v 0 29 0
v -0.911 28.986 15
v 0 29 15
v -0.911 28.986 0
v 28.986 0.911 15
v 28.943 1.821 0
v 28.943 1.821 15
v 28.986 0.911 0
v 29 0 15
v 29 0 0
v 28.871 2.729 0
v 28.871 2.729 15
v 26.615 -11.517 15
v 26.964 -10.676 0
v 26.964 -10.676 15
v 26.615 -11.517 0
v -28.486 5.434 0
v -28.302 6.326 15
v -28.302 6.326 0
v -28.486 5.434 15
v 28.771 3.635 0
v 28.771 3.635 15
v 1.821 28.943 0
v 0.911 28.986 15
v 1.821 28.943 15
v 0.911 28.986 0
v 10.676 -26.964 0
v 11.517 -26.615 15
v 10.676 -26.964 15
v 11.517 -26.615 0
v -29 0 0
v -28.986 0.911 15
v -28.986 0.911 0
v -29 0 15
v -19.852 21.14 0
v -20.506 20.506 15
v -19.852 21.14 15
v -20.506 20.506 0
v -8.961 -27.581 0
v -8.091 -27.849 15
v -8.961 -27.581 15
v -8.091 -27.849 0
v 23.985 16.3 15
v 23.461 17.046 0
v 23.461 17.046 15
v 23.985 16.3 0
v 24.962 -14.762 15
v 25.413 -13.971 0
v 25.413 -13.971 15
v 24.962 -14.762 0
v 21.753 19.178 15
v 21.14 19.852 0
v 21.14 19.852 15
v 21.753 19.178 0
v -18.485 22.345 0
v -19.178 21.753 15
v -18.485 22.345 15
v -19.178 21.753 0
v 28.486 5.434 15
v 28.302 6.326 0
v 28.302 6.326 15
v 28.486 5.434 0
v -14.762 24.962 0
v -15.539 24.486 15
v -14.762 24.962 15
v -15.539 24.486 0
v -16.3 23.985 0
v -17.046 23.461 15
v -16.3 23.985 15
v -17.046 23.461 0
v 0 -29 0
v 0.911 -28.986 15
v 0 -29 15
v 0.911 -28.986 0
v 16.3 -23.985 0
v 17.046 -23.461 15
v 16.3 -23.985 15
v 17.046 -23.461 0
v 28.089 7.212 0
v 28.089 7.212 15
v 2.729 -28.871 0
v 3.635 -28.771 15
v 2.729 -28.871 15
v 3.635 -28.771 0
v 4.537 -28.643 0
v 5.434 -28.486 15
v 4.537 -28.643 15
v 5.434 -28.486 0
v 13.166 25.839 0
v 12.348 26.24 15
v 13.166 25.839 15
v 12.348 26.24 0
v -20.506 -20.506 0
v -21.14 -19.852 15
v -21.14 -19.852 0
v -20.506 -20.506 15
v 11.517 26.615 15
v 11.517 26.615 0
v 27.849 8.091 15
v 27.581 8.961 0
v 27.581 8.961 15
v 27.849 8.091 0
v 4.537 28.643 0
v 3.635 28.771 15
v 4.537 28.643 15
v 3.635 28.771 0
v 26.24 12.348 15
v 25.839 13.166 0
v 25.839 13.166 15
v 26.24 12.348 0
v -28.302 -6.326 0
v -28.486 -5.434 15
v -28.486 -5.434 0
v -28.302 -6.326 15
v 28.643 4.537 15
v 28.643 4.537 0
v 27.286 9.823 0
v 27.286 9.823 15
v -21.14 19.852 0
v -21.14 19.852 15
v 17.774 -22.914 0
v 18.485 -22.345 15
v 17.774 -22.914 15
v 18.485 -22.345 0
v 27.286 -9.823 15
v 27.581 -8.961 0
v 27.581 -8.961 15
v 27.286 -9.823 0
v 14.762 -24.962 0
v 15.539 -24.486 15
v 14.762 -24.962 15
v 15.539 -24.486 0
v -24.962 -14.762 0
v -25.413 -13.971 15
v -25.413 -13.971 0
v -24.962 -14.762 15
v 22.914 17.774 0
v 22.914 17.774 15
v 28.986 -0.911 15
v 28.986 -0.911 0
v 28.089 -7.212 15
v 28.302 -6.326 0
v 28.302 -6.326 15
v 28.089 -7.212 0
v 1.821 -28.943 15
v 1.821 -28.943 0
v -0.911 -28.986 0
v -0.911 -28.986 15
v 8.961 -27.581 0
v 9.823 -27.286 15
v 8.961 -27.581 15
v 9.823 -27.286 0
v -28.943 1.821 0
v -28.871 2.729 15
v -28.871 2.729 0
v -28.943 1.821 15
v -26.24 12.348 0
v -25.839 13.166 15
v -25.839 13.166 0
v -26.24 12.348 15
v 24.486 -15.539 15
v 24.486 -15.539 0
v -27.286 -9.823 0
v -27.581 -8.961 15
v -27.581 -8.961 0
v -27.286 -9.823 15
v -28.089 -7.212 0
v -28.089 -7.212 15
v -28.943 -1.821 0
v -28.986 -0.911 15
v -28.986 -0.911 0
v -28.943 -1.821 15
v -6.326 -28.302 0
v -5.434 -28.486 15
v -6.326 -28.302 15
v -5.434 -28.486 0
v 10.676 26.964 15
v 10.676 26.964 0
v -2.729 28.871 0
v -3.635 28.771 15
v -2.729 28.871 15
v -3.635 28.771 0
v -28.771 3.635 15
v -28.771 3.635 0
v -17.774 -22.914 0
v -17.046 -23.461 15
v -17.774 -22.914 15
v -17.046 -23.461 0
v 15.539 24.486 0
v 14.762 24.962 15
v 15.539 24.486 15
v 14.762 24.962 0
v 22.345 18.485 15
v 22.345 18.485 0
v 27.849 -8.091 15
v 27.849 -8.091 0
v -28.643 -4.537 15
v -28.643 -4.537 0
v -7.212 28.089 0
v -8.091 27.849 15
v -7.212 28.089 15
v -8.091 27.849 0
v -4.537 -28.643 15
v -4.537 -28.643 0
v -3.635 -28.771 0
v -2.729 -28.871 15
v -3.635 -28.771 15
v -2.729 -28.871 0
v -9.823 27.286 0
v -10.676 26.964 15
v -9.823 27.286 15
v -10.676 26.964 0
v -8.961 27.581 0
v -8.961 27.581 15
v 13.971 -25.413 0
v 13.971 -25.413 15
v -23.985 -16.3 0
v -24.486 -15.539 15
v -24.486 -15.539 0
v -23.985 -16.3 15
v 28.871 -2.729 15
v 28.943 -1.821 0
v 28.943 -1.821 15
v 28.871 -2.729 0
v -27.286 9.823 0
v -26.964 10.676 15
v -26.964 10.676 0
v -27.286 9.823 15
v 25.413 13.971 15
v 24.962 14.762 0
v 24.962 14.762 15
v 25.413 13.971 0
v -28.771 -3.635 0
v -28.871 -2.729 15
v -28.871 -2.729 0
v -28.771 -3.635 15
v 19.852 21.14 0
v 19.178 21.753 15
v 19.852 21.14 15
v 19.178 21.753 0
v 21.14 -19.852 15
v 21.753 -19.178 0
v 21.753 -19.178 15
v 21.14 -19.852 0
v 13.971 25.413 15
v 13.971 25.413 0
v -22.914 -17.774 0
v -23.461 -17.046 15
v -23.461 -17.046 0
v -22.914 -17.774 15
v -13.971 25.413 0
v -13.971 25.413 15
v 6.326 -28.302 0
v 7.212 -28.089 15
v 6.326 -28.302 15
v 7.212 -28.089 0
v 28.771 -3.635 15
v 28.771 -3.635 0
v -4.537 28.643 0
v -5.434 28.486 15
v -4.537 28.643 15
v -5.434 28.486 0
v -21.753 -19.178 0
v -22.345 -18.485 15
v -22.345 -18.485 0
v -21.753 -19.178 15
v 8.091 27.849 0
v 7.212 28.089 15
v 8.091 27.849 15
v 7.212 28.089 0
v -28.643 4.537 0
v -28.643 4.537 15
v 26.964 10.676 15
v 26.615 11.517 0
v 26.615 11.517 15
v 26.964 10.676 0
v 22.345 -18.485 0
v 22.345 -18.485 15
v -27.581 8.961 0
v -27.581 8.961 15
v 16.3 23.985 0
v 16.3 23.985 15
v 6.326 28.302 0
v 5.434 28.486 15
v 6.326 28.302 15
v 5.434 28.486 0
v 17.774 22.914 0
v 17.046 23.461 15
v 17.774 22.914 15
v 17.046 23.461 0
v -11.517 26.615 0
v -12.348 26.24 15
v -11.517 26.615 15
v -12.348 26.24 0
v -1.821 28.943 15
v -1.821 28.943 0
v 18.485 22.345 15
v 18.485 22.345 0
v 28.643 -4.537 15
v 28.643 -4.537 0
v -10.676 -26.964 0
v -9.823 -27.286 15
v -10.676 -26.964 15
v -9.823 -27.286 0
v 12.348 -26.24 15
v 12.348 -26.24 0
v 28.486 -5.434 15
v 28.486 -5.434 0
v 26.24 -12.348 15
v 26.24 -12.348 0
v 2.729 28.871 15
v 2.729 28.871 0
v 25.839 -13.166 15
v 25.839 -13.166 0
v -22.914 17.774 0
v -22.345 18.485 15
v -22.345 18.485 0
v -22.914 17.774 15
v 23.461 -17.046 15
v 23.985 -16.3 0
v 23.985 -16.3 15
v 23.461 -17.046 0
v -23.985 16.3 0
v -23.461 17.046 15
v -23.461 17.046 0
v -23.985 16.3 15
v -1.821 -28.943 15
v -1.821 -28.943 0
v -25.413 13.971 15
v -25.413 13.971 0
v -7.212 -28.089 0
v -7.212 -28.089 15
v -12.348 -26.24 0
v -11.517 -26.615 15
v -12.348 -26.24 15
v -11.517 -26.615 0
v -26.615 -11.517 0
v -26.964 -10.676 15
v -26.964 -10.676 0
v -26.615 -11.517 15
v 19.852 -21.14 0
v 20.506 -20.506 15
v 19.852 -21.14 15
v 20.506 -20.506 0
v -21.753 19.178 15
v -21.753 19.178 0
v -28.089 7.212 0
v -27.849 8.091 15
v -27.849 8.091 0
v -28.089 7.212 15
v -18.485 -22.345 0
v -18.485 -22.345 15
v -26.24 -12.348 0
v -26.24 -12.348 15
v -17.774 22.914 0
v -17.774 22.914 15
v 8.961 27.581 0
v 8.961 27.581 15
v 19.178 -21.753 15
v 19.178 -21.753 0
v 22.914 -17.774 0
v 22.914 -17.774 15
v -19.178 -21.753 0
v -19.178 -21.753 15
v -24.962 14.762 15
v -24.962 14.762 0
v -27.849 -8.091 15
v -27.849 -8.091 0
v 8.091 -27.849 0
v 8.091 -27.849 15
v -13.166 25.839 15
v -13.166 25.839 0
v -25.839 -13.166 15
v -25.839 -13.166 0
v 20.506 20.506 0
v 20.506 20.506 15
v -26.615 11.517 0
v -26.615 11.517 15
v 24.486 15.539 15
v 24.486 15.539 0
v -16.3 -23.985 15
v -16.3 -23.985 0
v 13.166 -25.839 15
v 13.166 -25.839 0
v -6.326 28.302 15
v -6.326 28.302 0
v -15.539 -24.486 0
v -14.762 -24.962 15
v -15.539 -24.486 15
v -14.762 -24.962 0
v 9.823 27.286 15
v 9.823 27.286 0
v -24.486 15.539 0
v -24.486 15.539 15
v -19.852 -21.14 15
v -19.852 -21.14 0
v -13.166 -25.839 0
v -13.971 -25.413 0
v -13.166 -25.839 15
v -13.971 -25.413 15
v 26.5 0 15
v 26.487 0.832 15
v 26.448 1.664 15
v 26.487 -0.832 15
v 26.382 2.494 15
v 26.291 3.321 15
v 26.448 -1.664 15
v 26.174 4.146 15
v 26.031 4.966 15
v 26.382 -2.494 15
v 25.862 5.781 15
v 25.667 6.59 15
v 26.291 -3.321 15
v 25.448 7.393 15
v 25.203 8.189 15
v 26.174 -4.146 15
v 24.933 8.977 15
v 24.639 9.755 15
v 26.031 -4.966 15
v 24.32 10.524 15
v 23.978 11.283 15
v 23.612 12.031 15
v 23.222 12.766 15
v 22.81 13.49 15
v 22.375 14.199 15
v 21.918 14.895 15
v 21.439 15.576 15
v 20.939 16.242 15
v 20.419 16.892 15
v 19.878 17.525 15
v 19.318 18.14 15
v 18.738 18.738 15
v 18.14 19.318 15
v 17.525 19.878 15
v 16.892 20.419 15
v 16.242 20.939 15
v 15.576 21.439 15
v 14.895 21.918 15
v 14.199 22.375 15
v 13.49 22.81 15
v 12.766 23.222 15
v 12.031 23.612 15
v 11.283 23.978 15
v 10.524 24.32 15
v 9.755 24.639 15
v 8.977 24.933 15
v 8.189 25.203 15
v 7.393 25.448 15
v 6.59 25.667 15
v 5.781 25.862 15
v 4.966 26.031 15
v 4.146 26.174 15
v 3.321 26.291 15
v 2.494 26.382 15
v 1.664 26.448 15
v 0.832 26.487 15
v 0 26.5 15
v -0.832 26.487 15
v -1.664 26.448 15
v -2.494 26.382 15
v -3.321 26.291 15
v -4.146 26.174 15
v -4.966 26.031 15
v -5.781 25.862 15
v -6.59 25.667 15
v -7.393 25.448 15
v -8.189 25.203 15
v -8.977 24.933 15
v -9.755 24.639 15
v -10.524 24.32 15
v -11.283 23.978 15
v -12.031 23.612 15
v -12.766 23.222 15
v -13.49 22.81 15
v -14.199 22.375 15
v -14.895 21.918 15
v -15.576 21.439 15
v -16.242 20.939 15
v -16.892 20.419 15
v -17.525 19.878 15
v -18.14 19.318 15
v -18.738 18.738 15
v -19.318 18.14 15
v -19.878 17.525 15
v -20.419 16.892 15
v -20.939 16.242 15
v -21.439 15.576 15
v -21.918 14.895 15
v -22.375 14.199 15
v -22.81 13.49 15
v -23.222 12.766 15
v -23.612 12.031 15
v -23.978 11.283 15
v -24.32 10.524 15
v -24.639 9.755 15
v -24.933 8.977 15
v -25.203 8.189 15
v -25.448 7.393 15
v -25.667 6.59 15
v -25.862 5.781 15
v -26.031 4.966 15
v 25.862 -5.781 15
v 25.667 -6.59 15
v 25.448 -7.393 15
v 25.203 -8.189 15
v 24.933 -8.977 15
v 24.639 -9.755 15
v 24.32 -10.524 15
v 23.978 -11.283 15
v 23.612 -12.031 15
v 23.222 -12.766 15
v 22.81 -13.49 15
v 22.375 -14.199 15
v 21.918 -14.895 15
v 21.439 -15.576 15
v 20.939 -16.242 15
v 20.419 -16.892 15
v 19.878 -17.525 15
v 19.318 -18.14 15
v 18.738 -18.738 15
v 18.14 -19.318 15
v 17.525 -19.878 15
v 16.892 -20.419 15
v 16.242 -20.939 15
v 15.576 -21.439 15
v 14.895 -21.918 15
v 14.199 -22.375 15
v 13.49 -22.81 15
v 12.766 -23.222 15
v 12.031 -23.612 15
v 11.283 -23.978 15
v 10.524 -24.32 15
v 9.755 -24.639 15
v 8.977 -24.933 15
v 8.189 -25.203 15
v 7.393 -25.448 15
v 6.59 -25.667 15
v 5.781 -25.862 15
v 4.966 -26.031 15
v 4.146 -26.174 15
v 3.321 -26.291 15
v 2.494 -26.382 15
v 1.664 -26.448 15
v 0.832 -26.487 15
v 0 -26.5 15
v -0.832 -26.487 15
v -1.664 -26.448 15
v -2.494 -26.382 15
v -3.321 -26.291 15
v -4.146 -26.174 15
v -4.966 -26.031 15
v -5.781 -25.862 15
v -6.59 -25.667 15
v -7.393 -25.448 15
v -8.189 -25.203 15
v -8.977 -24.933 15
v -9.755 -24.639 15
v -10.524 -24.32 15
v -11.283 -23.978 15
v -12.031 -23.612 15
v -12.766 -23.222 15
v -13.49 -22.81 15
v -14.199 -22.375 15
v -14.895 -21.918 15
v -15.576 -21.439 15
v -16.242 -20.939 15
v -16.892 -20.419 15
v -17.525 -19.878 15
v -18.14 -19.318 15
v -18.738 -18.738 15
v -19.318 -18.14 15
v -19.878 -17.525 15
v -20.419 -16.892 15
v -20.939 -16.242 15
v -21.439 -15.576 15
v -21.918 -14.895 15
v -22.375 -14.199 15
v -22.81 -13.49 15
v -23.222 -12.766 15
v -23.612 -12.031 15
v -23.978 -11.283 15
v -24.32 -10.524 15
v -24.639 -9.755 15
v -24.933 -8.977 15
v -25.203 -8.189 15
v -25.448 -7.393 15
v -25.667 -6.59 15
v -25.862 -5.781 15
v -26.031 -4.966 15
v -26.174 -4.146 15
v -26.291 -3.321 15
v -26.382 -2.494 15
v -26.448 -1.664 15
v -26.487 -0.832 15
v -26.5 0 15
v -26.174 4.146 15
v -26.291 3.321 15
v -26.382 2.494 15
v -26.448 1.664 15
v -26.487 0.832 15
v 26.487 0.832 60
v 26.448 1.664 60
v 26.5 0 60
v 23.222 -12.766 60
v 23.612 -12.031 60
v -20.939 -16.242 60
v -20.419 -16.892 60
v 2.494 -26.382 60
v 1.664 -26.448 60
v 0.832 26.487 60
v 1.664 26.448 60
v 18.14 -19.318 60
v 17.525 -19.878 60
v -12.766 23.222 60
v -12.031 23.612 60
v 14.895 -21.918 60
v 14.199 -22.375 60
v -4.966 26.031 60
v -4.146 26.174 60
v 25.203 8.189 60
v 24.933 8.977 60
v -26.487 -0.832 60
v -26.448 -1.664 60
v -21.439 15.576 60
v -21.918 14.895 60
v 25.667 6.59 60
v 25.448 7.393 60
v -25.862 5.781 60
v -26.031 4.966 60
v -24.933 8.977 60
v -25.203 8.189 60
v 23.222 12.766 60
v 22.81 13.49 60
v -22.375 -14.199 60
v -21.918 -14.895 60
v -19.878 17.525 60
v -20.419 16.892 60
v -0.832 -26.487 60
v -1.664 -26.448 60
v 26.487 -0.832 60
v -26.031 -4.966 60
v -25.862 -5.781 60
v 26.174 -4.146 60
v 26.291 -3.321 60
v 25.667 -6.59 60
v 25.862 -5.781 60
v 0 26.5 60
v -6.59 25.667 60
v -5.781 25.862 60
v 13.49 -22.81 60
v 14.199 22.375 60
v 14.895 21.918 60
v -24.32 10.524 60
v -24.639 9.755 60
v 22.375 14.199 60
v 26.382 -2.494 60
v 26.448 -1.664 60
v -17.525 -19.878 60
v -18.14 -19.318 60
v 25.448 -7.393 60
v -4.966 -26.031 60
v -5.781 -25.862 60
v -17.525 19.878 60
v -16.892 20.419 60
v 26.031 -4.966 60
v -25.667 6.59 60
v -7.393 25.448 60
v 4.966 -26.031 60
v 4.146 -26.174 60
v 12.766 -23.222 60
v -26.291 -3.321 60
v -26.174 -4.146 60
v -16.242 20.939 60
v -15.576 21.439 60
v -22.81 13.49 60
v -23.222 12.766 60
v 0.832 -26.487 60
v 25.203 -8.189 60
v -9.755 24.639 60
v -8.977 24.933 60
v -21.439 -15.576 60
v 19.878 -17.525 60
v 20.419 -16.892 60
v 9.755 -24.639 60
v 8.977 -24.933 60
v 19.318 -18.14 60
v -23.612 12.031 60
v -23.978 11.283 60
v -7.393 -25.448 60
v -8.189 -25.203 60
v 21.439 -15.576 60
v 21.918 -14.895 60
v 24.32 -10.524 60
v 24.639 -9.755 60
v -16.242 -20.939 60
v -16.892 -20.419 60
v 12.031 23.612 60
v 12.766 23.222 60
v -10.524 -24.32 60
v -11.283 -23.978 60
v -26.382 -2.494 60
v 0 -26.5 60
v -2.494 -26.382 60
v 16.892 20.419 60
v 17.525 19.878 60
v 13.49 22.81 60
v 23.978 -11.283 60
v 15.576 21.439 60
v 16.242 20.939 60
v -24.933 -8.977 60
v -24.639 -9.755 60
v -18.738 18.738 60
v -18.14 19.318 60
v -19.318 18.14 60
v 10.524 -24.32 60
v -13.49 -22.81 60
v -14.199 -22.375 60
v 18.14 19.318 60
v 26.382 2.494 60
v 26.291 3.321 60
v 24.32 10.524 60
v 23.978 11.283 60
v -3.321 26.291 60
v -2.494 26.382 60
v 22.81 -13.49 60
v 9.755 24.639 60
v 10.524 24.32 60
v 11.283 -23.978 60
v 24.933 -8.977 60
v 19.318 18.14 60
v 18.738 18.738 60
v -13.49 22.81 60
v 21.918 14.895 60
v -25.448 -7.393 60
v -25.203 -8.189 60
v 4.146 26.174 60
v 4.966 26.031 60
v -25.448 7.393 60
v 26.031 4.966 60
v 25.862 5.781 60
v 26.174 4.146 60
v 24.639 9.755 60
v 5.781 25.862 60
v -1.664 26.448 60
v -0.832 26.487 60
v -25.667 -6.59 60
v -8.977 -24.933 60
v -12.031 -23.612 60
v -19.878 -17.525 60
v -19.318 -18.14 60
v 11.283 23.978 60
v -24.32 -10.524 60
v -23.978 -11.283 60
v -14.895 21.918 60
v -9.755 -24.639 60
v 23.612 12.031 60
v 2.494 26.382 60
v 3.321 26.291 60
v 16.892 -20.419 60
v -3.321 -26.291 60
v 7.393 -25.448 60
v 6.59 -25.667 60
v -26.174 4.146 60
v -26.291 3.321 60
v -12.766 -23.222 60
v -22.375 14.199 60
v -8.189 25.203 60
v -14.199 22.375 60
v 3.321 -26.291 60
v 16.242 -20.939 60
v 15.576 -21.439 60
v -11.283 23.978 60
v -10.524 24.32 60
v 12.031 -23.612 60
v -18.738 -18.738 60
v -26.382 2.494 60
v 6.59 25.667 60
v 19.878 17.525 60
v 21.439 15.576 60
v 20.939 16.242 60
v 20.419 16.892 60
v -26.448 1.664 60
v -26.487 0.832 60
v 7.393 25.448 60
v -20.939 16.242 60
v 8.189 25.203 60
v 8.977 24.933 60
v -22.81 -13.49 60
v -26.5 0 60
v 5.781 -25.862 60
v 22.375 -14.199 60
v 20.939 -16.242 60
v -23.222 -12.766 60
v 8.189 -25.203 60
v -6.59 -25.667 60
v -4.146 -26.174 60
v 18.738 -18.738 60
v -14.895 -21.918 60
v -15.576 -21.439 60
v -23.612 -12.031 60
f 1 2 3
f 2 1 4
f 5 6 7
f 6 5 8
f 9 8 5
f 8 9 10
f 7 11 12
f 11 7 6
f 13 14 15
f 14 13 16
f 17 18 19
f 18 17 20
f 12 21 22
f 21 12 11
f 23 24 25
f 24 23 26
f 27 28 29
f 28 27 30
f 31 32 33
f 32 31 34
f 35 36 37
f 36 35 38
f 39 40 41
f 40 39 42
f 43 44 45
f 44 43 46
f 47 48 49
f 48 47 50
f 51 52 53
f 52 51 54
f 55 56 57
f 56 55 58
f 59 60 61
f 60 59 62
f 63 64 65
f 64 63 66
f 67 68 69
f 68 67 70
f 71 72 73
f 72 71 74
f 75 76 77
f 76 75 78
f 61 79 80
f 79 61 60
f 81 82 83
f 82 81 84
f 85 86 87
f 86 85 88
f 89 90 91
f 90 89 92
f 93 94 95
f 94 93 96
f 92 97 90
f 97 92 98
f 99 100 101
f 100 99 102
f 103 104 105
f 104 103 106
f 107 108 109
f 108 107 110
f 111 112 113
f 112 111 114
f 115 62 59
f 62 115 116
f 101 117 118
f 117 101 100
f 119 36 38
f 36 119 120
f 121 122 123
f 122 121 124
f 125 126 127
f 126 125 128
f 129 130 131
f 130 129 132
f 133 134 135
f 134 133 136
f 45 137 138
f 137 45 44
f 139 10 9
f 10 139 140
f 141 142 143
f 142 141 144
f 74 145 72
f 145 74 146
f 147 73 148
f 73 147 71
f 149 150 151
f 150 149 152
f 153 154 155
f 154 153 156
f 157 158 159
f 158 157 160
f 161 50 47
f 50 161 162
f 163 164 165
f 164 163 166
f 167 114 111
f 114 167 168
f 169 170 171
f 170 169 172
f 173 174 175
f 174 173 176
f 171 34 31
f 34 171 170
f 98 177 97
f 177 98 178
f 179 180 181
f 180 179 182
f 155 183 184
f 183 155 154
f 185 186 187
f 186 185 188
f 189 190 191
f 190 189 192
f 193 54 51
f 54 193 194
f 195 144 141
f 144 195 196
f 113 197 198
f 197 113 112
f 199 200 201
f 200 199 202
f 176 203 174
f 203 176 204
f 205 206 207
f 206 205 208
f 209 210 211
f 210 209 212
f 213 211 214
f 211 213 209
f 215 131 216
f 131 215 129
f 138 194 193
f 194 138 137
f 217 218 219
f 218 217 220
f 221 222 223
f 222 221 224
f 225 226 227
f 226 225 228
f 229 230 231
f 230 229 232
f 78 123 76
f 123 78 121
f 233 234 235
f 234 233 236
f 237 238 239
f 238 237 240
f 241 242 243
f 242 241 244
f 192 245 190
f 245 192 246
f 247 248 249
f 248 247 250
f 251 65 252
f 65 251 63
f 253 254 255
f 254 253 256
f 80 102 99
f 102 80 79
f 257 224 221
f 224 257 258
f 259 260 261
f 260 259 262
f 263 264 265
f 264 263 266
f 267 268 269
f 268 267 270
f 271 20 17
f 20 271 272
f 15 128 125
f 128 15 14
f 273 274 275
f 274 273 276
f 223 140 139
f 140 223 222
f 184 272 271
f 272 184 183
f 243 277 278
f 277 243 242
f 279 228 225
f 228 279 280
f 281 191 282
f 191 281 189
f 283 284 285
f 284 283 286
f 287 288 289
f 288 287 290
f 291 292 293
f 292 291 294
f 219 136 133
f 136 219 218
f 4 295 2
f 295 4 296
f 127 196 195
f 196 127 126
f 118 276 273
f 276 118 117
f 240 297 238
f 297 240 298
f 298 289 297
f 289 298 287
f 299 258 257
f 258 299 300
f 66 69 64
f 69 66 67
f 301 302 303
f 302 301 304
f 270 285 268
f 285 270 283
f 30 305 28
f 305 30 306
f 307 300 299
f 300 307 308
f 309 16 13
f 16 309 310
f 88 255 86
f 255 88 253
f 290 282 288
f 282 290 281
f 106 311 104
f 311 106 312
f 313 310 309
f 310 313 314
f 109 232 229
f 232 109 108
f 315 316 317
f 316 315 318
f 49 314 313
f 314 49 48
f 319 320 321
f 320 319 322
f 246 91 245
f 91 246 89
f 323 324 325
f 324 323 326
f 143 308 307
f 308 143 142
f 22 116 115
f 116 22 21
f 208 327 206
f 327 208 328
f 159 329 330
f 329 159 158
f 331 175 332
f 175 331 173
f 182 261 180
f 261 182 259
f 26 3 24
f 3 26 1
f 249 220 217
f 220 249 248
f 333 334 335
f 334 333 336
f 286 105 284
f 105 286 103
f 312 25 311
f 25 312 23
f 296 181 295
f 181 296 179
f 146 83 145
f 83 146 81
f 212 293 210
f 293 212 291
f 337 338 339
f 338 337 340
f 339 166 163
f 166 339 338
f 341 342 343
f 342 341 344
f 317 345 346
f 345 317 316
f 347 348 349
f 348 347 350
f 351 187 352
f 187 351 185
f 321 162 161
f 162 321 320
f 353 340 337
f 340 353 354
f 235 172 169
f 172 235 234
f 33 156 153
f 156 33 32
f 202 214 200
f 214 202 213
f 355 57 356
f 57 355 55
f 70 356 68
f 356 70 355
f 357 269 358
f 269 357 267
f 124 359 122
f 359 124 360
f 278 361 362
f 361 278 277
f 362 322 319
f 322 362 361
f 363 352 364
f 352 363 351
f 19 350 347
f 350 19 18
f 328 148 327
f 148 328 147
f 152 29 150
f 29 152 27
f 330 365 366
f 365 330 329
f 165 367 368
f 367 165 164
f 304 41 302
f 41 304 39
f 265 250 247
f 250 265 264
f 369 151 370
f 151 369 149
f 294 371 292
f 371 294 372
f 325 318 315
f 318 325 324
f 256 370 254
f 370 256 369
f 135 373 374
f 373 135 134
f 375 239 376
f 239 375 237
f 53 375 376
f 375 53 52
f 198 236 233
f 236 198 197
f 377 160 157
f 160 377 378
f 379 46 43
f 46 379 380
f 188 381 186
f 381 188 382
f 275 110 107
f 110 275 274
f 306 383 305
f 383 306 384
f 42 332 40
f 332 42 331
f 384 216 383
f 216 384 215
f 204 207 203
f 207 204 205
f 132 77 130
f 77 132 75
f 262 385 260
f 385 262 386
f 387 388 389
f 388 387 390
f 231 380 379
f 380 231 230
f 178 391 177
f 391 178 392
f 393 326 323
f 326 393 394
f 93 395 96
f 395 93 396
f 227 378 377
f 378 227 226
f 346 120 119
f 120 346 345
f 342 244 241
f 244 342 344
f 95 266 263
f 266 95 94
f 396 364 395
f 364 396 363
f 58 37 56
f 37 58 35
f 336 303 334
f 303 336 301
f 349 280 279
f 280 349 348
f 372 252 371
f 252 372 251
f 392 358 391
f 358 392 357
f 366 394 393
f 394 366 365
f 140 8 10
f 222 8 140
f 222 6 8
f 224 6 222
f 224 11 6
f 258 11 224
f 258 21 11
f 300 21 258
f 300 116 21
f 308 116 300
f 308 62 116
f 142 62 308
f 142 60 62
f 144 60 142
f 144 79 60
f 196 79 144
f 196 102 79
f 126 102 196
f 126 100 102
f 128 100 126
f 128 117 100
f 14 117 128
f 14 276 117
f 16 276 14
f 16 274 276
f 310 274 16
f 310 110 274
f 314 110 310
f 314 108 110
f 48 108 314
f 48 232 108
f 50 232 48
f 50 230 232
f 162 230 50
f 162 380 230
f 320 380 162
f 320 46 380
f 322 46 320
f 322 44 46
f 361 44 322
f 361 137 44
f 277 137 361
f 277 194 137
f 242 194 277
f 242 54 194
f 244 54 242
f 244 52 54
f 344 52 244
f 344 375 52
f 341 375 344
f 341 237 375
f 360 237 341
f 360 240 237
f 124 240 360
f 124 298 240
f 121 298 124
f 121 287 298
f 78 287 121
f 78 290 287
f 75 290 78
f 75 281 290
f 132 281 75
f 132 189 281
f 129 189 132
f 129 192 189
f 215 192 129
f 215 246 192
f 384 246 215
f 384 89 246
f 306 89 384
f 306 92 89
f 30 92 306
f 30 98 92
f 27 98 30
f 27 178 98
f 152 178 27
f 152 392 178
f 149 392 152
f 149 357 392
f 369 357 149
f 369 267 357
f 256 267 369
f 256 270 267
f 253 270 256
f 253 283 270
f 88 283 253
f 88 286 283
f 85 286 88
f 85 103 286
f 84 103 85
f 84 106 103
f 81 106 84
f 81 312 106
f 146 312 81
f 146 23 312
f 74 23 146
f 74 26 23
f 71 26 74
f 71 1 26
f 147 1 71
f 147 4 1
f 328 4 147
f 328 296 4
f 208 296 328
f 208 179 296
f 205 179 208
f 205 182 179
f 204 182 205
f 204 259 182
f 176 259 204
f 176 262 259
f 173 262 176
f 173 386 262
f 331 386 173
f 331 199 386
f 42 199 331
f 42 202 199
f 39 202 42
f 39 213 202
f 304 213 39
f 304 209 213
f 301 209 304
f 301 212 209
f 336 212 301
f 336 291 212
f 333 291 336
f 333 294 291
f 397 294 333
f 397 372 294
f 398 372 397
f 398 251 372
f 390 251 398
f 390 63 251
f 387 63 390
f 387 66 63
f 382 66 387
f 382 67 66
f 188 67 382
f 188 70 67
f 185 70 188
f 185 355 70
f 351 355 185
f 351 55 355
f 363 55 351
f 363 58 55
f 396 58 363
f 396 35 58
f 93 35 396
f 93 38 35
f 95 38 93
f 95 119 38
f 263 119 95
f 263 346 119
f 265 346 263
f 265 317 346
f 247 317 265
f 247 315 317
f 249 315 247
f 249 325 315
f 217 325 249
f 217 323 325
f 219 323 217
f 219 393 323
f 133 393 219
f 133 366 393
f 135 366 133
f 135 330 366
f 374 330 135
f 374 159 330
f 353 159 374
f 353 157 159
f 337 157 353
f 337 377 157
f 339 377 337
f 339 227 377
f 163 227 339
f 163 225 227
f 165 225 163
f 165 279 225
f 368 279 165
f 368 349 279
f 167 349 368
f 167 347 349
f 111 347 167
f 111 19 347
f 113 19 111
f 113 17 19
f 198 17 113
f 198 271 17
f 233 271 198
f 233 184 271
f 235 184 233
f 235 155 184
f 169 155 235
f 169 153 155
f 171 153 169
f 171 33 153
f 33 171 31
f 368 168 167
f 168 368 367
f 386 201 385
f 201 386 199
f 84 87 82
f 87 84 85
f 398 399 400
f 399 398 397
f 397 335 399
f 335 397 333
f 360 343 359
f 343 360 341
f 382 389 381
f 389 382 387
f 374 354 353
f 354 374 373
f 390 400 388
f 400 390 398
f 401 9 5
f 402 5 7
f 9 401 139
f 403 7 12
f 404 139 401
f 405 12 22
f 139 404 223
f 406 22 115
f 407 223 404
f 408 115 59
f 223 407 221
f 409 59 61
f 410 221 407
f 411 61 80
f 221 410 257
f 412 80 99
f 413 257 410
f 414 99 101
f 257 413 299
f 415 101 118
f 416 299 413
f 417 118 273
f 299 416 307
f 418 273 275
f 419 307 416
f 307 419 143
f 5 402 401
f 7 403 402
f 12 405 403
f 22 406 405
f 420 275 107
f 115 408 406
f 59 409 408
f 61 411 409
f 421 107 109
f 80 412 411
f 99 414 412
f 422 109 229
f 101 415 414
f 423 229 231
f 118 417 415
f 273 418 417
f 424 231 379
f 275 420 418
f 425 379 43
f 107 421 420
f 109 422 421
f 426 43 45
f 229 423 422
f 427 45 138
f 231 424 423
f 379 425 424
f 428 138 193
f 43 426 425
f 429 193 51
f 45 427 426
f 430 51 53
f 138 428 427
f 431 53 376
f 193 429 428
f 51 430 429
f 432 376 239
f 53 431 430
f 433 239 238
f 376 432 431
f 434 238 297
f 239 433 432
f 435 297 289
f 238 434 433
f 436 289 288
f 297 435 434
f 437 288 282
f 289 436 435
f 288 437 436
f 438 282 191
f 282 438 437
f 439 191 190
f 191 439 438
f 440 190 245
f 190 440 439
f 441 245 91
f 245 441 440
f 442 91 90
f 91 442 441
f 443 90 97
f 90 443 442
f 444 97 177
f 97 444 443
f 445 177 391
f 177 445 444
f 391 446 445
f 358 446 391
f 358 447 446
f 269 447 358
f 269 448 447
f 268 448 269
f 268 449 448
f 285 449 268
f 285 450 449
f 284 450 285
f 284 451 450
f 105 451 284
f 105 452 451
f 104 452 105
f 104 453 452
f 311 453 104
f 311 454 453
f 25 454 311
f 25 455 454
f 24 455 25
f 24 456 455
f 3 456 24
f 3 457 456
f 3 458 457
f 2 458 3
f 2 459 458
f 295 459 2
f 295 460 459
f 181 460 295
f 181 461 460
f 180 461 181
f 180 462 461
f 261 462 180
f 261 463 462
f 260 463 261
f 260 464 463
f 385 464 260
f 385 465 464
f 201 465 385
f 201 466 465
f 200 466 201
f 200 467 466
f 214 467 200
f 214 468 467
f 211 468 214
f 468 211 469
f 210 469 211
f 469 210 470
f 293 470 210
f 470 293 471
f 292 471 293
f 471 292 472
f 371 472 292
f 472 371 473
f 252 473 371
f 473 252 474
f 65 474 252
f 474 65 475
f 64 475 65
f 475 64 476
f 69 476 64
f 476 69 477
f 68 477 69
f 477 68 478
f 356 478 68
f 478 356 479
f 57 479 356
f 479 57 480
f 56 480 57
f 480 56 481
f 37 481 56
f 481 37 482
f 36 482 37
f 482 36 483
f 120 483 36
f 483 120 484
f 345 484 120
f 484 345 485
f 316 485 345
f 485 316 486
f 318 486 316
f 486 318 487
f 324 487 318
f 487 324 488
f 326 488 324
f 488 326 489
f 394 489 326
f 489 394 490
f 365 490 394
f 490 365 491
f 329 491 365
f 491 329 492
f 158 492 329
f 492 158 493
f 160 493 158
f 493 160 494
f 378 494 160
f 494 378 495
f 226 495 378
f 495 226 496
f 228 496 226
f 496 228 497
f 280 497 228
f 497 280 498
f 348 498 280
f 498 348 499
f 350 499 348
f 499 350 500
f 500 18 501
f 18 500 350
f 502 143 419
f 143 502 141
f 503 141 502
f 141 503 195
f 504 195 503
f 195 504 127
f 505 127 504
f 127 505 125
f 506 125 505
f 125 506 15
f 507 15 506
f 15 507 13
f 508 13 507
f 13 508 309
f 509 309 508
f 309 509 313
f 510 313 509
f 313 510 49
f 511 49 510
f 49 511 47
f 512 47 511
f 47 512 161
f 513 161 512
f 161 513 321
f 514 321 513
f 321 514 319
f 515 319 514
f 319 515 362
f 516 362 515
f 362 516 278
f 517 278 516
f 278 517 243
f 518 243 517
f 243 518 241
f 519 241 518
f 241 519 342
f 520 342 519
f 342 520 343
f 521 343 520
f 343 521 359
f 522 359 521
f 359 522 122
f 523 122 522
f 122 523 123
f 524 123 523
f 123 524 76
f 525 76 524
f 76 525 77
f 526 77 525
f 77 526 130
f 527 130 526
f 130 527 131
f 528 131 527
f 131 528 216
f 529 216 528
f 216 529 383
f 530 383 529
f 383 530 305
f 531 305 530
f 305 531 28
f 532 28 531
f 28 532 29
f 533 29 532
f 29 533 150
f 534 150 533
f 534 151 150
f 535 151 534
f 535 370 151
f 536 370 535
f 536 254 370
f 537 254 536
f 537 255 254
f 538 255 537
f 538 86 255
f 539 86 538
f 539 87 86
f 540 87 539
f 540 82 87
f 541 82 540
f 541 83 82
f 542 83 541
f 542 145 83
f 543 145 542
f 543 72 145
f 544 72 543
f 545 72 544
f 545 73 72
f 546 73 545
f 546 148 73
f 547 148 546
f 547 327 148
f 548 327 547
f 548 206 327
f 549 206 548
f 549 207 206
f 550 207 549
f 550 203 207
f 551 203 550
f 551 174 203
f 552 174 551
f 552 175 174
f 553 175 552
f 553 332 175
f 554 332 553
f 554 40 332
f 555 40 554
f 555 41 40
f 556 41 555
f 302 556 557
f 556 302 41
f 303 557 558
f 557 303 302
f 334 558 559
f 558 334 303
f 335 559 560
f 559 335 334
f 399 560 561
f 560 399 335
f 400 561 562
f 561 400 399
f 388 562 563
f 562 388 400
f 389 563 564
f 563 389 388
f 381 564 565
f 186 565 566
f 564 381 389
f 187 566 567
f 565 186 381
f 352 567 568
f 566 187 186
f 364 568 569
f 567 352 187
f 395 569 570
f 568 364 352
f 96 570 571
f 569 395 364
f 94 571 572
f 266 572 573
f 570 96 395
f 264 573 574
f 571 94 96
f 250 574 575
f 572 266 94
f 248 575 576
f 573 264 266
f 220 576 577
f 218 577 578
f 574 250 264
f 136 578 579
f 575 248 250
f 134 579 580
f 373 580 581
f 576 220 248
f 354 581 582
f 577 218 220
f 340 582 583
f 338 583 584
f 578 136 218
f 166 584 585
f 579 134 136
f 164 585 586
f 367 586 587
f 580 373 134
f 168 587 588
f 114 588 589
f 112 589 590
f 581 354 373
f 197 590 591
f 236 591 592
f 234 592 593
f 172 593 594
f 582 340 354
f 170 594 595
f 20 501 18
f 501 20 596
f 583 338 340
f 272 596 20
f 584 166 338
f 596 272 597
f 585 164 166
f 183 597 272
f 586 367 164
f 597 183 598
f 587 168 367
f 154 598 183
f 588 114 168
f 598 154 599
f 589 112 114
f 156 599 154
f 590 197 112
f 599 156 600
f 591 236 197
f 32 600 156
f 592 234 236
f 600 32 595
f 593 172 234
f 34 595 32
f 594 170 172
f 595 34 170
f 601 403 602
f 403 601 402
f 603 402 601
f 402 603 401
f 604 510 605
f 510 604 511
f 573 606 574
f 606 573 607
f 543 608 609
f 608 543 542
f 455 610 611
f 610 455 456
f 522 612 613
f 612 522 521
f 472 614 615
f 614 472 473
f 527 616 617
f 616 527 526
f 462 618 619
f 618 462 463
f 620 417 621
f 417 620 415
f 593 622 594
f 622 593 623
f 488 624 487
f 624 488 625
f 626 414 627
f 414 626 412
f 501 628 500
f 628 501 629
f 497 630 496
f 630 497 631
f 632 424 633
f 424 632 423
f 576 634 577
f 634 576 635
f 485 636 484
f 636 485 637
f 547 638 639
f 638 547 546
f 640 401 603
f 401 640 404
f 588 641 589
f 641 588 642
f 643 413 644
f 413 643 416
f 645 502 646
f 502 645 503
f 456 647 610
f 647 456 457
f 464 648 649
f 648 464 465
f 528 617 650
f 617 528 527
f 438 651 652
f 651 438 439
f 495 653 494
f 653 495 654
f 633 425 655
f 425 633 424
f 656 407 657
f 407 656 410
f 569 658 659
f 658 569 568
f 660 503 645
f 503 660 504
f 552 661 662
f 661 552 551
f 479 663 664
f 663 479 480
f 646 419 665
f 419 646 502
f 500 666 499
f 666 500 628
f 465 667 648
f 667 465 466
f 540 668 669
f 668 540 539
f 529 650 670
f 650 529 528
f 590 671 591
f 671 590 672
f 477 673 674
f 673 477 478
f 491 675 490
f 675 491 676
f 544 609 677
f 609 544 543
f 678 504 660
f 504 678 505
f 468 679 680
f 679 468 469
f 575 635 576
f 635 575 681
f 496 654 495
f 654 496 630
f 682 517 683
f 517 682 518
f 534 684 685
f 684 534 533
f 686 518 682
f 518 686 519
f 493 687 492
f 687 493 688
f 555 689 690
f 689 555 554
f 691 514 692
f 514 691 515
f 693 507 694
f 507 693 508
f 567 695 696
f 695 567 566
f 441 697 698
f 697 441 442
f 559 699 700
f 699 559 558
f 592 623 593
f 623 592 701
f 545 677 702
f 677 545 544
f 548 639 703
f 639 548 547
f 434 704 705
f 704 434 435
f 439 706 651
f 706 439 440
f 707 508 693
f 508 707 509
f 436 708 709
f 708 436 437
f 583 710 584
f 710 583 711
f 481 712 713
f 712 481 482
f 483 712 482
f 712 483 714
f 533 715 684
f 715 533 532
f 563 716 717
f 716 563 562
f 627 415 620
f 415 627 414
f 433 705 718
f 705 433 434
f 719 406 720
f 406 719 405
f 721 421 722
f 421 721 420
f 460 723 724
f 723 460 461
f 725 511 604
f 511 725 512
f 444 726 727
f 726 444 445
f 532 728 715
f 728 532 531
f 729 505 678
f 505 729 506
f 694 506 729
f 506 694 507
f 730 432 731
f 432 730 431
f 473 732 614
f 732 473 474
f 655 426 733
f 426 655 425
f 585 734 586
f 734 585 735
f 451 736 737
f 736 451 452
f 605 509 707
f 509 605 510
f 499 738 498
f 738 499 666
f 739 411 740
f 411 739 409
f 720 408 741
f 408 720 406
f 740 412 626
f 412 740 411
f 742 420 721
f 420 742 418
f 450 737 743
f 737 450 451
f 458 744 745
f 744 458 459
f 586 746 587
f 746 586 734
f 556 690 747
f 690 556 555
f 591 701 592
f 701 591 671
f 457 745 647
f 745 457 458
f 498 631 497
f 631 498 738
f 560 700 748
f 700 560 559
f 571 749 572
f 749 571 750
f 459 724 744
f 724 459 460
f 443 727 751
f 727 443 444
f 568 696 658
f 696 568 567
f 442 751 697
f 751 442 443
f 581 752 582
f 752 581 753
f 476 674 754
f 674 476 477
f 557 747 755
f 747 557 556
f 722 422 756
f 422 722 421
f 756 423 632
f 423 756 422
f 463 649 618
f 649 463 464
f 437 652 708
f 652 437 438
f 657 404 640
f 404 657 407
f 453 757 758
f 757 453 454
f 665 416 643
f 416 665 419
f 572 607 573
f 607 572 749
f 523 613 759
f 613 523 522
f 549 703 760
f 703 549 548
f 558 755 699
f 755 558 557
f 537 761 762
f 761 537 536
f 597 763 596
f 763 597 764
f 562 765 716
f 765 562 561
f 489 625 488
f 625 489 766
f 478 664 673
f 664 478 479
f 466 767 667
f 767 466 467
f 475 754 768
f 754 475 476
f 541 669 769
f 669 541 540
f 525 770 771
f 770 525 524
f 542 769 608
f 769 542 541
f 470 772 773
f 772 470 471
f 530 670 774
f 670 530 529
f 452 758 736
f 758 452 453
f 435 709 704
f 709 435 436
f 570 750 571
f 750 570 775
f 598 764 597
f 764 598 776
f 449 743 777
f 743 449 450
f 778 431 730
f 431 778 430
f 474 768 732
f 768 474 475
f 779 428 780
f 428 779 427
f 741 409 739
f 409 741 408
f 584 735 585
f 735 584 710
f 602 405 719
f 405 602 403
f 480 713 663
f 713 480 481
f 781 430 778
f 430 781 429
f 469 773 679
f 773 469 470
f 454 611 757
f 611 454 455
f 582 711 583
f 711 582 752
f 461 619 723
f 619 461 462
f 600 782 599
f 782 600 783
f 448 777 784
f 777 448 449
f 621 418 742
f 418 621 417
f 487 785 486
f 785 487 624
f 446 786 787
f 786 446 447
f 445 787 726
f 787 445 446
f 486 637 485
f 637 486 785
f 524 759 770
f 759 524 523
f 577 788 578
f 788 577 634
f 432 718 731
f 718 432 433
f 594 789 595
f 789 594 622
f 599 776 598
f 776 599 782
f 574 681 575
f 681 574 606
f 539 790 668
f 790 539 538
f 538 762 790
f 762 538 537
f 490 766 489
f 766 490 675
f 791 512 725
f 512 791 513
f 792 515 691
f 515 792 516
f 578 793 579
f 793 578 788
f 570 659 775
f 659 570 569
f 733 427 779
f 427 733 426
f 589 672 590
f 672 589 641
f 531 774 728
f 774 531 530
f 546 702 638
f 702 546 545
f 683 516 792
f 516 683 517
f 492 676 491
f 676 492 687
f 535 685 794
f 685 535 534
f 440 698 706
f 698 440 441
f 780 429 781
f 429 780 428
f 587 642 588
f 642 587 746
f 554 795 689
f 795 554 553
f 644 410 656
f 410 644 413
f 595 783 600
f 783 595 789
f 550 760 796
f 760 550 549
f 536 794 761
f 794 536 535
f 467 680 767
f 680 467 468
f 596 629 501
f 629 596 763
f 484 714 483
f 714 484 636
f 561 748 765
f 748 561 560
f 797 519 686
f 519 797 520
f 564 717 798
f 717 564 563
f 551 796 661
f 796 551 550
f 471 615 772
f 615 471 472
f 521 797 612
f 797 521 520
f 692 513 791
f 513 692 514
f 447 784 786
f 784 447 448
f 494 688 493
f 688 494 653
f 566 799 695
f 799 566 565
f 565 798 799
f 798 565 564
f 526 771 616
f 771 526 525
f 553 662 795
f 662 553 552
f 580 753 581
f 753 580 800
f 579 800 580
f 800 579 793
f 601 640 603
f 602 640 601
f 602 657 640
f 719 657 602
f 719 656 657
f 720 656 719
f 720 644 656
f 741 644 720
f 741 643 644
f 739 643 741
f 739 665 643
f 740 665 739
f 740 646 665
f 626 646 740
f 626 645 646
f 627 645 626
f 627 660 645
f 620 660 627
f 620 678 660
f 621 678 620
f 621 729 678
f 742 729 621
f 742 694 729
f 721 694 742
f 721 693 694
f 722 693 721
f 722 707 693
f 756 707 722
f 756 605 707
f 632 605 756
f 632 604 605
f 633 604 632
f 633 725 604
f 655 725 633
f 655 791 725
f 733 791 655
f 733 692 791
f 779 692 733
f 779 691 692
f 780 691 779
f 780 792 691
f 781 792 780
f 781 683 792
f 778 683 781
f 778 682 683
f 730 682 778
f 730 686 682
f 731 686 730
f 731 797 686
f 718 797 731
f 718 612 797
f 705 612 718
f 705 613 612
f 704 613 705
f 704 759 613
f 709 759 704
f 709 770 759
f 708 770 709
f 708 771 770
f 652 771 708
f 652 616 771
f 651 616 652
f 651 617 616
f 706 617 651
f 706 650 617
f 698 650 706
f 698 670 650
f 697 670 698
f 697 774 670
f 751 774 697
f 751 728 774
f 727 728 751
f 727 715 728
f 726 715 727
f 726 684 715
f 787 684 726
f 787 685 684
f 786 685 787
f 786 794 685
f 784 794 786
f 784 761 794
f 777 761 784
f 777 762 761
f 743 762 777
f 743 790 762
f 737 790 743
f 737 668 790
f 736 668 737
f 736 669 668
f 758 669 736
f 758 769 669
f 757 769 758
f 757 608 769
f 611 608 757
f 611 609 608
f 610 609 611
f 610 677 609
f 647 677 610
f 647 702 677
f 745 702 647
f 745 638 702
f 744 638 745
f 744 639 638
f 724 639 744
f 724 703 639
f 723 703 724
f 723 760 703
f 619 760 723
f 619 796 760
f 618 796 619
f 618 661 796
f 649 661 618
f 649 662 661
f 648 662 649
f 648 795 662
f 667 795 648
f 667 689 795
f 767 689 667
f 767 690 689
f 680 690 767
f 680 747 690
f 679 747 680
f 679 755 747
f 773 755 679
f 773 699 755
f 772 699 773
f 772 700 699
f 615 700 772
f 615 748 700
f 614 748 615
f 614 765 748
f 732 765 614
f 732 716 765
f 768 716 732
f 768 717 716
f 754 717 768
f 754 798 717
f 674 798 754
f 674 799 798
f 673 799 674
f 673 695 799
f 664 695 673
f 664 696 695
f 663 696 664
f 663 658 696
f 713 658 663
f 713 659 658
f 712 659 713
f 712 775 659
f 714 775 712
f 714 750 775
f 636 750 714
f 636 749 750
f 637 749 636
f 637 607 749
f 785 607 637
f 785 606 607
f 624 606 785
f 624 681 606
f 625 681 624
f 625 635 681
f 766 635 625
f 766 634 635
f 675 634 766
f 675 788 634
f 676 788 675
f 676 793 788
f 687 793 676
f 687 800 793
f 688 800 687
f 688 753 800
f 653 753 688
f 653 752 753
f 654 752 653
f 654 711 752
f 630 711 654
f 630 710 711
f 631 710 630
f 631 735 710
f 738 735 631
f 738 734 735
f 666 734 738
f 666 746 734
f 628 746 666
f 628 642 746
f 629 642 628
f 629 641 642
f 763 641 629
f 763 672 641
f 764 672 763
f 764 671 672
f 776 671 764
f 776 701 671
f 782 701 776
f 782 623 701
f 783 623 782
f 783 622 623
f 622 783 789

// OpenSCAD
/*
    Double-ended (duel) Espresso Tamper
    https://github.com/GeoMaciolek/double-ended-espresso-tamper


/*  *********************
    Customizable Settings
    ********************* */

/* [Tamper A] */

// Tamper A's Diameter (mm)
tamper_a_diameter_mm=58.0; // 0.1

// Tamper A's Thickness (mm)
tamper_a_thickness_mm=15.0; // 0.1

/* [Tamper B] */

// Tamper B's Diameter (mm)
tamper_b_diameter_mm=53.0; // 0.1

// Tamper B's Thickness (mm)
tamper_b_thickness_mm=15.0; // 0.1

/* [Shaft] */

// Shaft's Length (mm)
shaft_length_mm=30.0; // 0.1

// // Shaft's Diameter (mm) - should be the same as smaller B's Diameter
// shaft_diameter_mm=53.0; // 0.1

/*  **************************
    End Settings, Begin Script
    ************************** */
// Number of segments / fineness of the circles/cylinders
$fn=200;

// Select the shaft diameter - the same as the smaller tamper diameter
    shaft_diameter_mm = (tamper_a_diameter_mm > tamper_b_diameter_mm) ? tamper_b_diameter_mm : tamper_a_diameter_mm;


// Combine these objects
union() {

// Create Tamper A
cylinder(r = tamper_a_diameter_mm/2, h = tamper_a_thickness_mm);

// Create Shaft between tamper A and tamper B
translate([0,0,tamper_a_thickness_mm]) cylinder(r = shaft_diameter_mm/2, h = shaft_length_mm);

// Create Tamper B
translate([0,0,tamper_a_thickness_mm+shaft_length_mm]) cylinder(r = tamper_b_diameter_mm/2, h = tamper_b_thickness_mm);
};
